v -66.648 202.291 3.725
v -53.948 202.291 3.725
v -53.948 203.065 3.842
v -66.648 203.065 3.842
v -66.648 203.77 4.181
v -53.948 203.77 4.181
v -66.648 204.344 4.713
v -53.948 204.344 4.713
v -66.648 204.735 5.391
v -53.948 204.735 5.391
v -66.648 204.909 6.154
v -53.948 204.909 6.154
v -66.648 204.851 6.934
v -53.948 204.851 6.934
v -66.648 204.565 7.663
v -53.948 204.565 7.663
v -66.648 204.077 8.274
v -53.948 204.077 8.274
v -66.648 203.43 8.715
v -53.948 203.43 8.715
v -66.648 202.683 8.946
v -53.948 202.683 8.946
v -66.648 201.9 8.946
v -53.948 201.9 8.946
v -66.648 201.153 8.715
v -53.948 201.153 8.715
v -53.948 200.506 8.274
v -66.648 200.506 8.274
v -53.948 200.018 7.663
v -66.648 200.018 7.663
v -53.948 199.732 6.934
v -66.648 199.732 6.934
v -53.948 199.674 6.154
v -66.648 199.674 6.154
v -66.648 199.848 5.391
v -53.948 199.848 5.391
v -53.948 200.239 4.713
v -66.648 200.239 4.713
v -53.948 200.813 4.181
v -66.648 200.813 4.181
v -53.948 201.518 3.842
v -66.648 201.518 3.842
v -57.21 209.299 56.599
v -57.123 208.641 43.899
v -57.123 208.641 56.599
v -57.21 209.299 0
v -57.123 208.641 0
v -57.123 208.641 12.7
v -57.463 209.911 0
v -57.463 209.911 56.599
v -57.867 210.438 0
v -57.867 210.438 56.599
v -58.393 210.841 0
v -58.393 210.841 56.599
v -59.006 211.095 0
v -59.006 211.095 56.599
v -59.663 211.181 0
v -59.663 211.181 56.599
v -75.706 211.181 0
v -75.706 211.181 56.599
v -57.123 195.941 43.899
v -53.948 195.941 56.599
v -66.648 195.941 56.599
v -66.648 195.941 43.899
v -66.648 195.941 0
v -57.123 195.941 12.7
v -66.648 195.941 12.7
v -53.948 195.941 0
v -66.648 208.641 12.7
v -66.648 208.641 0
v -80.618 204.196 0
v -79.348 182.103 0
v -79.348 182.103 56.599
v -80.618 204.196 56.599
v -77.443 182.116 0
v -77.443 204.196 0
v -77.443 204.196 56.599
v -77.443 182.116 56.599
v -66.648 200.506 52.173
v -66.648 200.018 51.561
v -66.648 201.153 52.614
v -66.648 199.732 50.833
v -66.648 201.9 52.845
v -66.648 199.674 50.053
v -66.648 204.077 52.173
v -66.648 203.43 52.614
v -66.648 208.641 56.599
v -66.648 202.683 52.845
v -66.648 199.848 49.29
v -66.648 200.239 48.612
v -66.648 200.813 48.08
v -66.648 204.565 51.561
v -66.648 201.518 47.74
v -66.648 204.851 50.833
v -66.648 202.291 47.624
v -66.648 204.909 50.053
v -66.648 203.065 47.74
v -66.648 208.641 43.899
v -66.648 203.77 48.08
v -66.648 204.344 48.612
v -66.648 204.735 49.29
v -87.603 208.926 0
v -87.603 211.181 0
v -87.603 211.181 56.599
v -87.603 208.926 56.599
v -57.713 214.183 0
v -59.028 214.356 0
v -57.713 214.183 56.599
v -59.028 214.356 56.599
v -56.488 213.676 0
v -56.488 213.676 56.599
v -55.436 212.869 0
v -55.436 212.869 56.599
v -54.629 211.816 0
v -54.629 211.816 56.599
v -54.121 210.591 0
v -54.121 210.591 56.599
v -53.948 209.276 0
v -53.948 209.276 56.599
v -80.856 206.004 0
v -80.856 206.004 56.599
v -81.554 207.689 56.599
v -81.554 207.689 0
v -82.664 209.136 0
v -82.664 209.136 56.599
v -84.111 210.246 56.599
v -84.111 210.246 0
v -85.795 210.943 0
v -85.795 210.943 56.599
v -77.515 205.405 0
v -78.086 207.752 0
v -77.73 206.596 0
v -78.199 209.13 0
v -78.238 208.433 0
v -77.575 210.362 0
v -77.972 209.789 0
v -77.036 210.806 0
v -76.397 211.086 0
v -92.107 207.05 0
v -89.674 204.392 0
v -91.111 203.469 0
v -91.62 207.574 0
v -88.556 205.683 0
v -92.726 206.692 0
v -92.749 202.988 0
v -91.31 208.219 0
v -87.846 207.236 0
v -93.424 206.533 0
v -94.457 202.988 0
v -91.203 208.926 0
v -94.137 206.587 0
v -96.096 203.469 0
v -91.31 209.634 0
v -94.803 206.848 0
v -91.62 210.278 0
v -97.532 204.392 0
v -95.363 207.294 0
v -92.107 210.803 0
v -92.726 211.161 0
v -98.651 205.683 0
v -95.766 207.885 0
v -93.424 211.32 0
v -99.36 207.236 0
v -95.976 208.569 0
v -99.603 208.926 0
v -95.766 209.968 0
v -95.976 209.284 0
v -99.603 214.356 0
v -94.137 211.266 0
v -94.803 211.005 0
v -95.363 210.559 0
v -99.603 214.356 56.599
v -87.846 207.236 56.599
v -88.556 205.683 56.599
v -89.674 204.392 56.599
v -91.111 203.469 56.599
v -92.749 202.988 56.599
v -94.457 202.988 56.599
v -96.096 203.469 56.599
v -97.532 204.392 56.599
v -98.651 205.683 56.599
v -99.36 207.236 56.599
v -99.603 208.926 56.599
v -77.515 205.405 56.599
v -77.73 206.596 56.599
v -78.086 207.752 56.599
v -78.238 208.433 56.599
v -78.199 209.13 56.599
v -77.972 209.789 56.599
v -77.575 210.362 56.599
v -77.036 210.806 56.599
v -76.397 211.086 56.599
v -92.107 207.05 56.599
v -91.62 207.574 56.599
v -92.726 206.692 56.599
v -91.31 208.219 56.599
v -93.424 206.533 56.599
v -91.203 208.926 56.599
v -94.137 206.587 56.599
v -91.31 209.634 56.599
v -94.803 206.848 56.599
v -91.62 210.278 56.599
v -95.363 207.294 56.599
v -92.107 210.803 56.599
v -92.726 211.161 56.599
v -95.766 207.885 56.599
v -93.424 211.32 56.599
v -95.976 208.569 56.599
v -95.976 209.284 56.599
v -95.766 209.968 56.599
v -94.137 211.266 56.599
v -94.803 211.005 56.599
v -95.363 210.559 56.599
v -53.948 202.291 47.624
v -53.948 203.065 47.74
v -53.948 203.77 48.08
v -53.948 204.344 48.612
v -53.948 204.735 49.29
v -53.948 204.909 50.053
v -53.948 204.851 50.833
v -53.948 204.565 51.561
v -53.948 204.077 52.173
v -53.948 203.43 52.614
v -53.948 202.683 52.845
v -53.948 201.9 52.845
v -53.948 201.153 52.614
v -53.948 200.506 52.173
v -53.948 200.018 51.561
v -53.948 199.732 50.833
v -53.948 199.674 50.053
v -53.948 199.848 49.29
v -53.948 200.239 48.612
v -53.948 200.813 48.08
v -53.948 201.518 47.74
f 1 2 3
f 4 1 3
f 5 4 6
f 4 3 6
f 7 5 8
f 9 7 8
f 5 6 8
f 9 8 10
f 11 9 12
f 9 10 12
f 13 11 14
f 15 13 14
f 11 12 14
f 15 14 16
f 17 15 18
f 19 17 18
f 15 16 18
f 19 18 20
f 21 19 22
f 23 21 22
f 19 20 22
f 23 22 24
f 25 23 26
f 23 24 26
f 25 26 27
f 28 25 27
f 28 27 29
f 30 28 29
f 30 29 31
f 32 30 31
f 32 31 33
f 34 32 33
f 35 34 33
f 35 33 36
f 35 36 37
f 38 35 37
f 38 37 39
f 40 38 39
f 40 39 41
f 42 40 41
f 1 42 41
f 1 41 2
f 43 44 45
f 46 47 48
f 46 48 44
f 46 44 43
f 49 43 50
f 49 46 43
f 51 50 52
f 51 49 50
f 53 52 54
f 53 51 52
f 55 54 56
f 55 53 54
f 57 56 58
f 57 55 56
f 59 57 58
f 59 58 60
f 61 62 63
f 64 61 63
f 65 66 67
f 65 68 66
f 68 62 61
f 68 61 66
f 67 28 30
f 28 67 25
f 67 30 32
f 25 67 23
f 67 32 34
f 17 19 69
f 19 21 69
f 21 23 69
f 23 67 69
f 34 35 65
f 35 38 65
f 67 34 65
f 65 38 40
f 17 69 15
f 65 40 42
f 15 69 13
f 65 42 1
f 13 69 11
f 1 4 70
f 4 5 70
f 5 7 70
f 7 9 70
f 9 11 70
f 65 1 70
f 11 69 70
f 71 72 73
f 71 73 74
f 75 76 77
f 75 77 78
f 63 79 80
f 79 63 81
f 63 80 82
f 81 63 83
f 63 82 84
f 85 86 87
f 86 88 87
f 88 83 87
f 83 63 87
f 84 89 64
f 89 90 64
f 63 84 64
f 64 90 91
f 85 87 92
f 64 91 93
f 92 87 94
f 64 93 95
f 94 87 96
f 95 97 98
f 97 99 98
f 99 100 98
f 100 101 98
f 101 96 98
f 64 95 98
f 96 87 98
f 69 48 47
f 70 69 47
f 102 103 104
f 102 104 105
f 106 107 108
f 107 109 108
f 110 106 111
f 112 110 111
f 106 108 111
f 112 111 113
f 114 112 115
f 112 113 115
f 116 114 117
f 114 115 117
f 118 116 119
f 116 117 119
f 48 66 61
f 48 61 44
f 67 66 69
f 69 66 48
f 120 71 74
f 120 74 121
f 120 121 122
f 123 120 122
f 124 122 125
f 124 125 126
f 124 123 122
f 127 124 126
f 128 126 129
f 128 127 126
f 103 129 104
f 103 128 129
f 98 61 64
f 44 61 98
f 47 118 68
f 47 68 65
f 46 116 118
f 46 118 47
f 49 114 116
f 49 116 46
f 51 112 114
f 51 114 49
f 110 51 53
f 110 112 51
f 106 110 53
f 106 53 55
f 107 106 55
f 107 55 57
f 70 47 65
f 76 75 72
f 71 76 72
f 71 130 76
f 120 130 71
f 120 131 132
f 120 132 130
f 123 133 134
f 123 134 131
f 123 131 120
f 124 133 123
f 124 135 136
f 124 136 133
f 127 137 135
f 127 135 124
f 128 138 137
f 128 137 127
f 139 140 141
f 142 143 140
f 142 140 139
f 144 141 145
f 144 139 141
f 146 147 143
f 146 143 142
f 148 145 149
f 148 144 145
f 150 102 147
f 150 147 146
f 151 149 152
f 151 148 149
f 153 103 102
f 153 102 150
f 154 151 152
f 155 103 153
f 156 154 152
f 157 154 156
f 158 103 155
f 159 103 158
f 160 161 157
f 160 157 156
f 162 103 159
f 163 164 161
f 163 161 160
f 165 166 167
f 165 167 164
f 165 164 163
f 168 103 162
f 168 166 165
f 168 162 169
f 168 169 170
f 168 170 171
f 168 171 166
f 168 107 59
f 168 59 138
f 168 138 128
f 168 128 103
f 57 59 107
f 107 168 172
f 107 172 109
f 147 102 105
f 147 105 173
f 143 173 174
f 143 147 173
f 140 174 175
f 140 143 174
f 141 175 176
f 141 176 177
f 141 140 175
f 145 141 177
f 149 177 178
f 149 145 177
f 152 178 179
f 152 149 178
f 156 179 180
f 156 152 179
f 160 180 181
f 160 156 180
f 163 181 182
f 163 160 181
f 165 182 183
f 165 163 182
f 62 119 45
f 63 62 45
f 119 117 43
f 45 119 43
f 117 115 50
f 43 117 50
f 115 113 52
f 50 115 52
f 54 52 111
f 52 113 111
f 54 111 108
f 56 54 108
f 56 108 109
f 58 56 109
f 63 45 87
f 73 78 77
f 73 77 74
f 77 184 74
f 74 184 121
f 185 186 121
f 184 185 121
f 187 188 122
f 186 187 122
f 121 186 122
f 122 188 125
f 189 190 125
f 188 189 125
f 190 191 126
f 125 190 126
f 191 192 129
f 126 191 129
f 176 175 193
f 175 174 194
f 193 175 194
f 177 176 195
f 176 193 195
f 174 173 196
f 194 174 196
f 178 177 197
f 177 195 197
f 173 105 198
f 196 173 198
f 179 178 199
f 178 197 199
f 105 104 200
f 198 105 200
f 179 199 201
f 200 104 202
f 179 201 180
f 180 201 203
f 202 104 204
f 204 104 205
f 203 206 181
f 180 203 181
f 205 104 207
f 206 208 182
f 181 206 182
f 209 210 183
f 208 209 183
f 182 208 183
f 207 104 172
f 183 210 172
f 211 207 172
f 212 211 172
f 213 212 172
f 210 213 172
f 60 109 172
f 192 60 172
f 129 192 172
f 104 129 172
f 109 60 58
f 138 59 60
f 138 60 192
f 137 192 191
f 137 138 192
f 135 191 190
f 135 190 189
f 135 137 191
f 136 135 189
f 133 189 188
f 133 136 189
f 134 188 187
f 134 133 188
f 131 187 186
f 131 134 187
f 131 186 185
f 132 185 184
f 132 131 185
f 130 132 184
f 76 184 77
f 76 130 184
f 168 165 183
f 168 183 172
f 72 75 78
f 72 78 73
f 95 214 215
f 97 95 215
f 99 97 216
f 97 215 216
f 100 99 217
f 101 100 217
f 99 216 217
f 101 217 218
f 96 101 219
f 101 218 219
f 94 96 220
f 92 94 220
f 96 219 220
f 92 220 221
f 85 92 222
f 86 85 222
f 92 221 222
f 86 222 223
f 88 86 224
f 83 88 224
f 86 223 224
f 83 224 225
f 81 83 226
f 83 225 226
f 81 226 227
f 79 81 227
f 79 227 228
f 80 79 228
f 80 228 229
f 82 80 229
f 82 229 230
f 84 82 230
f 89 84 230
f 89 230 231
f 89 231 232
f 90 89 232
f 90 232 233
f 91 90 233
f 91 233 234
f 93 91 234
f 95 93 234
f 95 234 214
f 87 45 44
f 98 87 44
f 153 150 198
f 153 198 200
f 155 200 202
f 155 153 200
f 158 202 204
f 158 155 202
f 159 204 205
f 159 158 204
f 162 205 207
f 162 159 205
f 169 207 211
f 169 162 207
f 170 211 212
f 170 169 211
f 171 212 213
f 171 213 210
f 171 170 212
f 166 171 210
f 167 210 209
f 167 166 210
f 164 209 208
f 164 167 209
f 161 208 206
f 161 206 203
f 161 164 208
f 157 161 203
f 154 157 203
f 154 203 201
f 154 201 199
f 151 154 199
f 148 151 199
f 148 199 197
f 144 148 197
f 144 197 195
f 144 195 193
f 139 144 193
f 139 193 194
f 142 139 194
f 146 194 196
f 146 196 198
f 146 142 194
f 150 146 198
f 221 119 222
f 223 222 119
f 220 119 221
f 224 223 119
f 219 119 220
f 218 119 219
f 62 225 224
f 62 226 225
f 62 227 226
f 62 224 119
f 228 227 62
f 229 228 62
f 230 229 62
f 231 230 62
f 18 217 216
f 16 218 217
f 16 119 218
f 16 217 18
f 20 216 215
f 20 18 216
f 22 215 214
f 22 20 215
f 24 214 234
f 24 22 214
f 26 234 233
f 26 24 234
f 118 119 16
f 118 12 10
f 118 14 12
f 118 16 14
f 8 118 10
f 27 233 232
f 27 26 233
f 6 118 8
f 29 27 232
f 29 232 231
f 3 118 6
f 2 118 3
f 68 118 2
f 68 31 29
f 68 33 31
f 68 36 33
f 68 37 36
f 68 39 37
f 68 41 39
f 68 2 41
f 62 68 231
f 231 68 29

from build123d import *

# Parameters (mm, degrees)
SKETCH1_R           = 2.4
BOSS_EXTRUDE1_DEPTH = 56.59882
SKETCH7_W           = 12.7
SKETCH7_H           = 12.7
BOSS_EXTRUDE3_DEPTH = 12.7
CUT_EXTRUDE2_REACH  = 228.355
SKETCH8_R           = 2.625
FILLET1_R           = 5.08


with BuildPart() as part:
    # Sketch1 → Boss-Extrude1 (new body)
    with BuildSketch(Plane.XY):
        with BuildLine():
            Line((-77.443191063, 182.115759687), (-79.348229949, 182.102566798))
            Line((-79.348229949, 182.102566798), (-80.618191063, 204.196458108))
            ThreePointArc((-80.618191063, 204.196458108), (-82.664050197, 209.135598974), (-87.603191063, 211.181458108))
            Line((-87.603191063, 211.181458108), (-87.603191063, 208.926458108))
            ThreePointArc((-87.603191063, 208.926458108), (-93.603191063, 202.926458108), (-99.603191063, 208.926458108))
            Line((-99.603191063, 208.926458108), (-99.603191063, 214.356458108))
            Line((-99.603191063, 214.356458108), (-90.238191127, 214.356458108))
            Line((-90.238191127, 214.356458108), (-87.603191063, 214.356458108))
            Line((-87.603191063, 214.356458108), (-76.173191063, 214.356458108))
            Line((-76.173191063, 214.356458108), (-53.948191063, 214.356458108))
            Line((-53.948191063, 214.356458108), (-53.948191063, 195.941458108))
            Line((-53.948191063, 195.941458108), (-57.123191063, 195.941458108))
            Line((-57.123191063, 195.941458108), (-57.123191063, 208.641458108))
            ThreePointArc((-57.123191063, 208.641458108), (-57.867139839, 210.437509332), (-59.663191063, 211.181458108))
            Line((-59.663191063, 211.181458108), (-75.706469876, 211.181458108))
            ThreePointArc((-75.706469876, 211.181458108), (-77.79329282, 210.089480898), (-78.085814114, 207.752458108))
            ThreePointArc((-78.085814114, 207.752458108), (-77.605137508, 206.003257791), (-77.443191063, 204.196458108))
            Line((-77.443191063, 204.196458108), (-77.443191063, 182.115759687))
        make_face()
        with Locations((-93.603191063, 208.926458108)):
            Circle(SKETCH1_R, mode=Mode.SUBTRACT)
    extrude(amount=BOSS_EXTRUDE1_DEPTH)

    # Sketch7 → Boss-Extrude3 (add)
    with BuildSketch(Plane(origin=(-53.948191063, 0, 0), x_dir=(0, 0, -1), z_dir=(1, 0, 0))):
        with Locations((-50.24882, 202.291458108)):
            Rectangle(SKETCH7_W, SKETCH7_H)
        with Locations((-6.35, 202.291458108)):
            Rectangle(SKETCH7_W, SKETCH7_H)
    extrude(amount=-BOSS_EXTRUDE3_DEPTH)

    # Sketch8 → Cut-Extrude2 (cut, up to next)
    with BuildSketch(Plane(origin=(-53.948191063, 0, 0), x_dir=(0, 0, -1), z_dir=(1, 0, 0)), mode=Mode.PRIVATE) as cut_extrude2_sk1:
        with Locations((-50.24882, 202.291458108)):
            Circle(SKETCH8_R)
    cut_extrude2_tool1 = extrude(cut_extrude2_sk1.sketch, amount=-CUT_EXTRUDE2_REACH, mode=Mode.PRIVATE) & part.part
    # Sketch8 → Cut-Extrude2 (cut, up to next)
    with BuildSketch(Plane(origin=(-53.948191063, 0, 0), x_dir=(0, 0, -1), z_dir=(1, 0, 0)), mode=Mode.PRIVATE) as cut_extrude2_sk2:
        with Locations((-6.35, 202.291458108)):
            Circle(SKETCH8_R)
    cut_extrude2_tool2 = extrude(cut_extrude2_sk2.sketch, amount=-CUT_EXTRUDE2_REACH, mode=Mode.PRIVATE) & part.part
    add(cut_extrude2_tool1.solids().sort_by_distance((-53.948191, 202.291458, 50.24882))[0], mode=Mode.SUBTRACT)
    add(cut_extrude2_tool2.solids().sort_by_distance((-53.948191, 202.291458, 6.35))[0], mode=Mode.SUBTRACT)

    # Fillet1
    fillet1_edges = [part.edges().sort_by_distance(p)[0] for p in [
        (-53.948191063, 214.356458108, 28.29941),
    ]]
    fillet(fillet1_edges, radius=FILLET1_R)


solid = part.part
